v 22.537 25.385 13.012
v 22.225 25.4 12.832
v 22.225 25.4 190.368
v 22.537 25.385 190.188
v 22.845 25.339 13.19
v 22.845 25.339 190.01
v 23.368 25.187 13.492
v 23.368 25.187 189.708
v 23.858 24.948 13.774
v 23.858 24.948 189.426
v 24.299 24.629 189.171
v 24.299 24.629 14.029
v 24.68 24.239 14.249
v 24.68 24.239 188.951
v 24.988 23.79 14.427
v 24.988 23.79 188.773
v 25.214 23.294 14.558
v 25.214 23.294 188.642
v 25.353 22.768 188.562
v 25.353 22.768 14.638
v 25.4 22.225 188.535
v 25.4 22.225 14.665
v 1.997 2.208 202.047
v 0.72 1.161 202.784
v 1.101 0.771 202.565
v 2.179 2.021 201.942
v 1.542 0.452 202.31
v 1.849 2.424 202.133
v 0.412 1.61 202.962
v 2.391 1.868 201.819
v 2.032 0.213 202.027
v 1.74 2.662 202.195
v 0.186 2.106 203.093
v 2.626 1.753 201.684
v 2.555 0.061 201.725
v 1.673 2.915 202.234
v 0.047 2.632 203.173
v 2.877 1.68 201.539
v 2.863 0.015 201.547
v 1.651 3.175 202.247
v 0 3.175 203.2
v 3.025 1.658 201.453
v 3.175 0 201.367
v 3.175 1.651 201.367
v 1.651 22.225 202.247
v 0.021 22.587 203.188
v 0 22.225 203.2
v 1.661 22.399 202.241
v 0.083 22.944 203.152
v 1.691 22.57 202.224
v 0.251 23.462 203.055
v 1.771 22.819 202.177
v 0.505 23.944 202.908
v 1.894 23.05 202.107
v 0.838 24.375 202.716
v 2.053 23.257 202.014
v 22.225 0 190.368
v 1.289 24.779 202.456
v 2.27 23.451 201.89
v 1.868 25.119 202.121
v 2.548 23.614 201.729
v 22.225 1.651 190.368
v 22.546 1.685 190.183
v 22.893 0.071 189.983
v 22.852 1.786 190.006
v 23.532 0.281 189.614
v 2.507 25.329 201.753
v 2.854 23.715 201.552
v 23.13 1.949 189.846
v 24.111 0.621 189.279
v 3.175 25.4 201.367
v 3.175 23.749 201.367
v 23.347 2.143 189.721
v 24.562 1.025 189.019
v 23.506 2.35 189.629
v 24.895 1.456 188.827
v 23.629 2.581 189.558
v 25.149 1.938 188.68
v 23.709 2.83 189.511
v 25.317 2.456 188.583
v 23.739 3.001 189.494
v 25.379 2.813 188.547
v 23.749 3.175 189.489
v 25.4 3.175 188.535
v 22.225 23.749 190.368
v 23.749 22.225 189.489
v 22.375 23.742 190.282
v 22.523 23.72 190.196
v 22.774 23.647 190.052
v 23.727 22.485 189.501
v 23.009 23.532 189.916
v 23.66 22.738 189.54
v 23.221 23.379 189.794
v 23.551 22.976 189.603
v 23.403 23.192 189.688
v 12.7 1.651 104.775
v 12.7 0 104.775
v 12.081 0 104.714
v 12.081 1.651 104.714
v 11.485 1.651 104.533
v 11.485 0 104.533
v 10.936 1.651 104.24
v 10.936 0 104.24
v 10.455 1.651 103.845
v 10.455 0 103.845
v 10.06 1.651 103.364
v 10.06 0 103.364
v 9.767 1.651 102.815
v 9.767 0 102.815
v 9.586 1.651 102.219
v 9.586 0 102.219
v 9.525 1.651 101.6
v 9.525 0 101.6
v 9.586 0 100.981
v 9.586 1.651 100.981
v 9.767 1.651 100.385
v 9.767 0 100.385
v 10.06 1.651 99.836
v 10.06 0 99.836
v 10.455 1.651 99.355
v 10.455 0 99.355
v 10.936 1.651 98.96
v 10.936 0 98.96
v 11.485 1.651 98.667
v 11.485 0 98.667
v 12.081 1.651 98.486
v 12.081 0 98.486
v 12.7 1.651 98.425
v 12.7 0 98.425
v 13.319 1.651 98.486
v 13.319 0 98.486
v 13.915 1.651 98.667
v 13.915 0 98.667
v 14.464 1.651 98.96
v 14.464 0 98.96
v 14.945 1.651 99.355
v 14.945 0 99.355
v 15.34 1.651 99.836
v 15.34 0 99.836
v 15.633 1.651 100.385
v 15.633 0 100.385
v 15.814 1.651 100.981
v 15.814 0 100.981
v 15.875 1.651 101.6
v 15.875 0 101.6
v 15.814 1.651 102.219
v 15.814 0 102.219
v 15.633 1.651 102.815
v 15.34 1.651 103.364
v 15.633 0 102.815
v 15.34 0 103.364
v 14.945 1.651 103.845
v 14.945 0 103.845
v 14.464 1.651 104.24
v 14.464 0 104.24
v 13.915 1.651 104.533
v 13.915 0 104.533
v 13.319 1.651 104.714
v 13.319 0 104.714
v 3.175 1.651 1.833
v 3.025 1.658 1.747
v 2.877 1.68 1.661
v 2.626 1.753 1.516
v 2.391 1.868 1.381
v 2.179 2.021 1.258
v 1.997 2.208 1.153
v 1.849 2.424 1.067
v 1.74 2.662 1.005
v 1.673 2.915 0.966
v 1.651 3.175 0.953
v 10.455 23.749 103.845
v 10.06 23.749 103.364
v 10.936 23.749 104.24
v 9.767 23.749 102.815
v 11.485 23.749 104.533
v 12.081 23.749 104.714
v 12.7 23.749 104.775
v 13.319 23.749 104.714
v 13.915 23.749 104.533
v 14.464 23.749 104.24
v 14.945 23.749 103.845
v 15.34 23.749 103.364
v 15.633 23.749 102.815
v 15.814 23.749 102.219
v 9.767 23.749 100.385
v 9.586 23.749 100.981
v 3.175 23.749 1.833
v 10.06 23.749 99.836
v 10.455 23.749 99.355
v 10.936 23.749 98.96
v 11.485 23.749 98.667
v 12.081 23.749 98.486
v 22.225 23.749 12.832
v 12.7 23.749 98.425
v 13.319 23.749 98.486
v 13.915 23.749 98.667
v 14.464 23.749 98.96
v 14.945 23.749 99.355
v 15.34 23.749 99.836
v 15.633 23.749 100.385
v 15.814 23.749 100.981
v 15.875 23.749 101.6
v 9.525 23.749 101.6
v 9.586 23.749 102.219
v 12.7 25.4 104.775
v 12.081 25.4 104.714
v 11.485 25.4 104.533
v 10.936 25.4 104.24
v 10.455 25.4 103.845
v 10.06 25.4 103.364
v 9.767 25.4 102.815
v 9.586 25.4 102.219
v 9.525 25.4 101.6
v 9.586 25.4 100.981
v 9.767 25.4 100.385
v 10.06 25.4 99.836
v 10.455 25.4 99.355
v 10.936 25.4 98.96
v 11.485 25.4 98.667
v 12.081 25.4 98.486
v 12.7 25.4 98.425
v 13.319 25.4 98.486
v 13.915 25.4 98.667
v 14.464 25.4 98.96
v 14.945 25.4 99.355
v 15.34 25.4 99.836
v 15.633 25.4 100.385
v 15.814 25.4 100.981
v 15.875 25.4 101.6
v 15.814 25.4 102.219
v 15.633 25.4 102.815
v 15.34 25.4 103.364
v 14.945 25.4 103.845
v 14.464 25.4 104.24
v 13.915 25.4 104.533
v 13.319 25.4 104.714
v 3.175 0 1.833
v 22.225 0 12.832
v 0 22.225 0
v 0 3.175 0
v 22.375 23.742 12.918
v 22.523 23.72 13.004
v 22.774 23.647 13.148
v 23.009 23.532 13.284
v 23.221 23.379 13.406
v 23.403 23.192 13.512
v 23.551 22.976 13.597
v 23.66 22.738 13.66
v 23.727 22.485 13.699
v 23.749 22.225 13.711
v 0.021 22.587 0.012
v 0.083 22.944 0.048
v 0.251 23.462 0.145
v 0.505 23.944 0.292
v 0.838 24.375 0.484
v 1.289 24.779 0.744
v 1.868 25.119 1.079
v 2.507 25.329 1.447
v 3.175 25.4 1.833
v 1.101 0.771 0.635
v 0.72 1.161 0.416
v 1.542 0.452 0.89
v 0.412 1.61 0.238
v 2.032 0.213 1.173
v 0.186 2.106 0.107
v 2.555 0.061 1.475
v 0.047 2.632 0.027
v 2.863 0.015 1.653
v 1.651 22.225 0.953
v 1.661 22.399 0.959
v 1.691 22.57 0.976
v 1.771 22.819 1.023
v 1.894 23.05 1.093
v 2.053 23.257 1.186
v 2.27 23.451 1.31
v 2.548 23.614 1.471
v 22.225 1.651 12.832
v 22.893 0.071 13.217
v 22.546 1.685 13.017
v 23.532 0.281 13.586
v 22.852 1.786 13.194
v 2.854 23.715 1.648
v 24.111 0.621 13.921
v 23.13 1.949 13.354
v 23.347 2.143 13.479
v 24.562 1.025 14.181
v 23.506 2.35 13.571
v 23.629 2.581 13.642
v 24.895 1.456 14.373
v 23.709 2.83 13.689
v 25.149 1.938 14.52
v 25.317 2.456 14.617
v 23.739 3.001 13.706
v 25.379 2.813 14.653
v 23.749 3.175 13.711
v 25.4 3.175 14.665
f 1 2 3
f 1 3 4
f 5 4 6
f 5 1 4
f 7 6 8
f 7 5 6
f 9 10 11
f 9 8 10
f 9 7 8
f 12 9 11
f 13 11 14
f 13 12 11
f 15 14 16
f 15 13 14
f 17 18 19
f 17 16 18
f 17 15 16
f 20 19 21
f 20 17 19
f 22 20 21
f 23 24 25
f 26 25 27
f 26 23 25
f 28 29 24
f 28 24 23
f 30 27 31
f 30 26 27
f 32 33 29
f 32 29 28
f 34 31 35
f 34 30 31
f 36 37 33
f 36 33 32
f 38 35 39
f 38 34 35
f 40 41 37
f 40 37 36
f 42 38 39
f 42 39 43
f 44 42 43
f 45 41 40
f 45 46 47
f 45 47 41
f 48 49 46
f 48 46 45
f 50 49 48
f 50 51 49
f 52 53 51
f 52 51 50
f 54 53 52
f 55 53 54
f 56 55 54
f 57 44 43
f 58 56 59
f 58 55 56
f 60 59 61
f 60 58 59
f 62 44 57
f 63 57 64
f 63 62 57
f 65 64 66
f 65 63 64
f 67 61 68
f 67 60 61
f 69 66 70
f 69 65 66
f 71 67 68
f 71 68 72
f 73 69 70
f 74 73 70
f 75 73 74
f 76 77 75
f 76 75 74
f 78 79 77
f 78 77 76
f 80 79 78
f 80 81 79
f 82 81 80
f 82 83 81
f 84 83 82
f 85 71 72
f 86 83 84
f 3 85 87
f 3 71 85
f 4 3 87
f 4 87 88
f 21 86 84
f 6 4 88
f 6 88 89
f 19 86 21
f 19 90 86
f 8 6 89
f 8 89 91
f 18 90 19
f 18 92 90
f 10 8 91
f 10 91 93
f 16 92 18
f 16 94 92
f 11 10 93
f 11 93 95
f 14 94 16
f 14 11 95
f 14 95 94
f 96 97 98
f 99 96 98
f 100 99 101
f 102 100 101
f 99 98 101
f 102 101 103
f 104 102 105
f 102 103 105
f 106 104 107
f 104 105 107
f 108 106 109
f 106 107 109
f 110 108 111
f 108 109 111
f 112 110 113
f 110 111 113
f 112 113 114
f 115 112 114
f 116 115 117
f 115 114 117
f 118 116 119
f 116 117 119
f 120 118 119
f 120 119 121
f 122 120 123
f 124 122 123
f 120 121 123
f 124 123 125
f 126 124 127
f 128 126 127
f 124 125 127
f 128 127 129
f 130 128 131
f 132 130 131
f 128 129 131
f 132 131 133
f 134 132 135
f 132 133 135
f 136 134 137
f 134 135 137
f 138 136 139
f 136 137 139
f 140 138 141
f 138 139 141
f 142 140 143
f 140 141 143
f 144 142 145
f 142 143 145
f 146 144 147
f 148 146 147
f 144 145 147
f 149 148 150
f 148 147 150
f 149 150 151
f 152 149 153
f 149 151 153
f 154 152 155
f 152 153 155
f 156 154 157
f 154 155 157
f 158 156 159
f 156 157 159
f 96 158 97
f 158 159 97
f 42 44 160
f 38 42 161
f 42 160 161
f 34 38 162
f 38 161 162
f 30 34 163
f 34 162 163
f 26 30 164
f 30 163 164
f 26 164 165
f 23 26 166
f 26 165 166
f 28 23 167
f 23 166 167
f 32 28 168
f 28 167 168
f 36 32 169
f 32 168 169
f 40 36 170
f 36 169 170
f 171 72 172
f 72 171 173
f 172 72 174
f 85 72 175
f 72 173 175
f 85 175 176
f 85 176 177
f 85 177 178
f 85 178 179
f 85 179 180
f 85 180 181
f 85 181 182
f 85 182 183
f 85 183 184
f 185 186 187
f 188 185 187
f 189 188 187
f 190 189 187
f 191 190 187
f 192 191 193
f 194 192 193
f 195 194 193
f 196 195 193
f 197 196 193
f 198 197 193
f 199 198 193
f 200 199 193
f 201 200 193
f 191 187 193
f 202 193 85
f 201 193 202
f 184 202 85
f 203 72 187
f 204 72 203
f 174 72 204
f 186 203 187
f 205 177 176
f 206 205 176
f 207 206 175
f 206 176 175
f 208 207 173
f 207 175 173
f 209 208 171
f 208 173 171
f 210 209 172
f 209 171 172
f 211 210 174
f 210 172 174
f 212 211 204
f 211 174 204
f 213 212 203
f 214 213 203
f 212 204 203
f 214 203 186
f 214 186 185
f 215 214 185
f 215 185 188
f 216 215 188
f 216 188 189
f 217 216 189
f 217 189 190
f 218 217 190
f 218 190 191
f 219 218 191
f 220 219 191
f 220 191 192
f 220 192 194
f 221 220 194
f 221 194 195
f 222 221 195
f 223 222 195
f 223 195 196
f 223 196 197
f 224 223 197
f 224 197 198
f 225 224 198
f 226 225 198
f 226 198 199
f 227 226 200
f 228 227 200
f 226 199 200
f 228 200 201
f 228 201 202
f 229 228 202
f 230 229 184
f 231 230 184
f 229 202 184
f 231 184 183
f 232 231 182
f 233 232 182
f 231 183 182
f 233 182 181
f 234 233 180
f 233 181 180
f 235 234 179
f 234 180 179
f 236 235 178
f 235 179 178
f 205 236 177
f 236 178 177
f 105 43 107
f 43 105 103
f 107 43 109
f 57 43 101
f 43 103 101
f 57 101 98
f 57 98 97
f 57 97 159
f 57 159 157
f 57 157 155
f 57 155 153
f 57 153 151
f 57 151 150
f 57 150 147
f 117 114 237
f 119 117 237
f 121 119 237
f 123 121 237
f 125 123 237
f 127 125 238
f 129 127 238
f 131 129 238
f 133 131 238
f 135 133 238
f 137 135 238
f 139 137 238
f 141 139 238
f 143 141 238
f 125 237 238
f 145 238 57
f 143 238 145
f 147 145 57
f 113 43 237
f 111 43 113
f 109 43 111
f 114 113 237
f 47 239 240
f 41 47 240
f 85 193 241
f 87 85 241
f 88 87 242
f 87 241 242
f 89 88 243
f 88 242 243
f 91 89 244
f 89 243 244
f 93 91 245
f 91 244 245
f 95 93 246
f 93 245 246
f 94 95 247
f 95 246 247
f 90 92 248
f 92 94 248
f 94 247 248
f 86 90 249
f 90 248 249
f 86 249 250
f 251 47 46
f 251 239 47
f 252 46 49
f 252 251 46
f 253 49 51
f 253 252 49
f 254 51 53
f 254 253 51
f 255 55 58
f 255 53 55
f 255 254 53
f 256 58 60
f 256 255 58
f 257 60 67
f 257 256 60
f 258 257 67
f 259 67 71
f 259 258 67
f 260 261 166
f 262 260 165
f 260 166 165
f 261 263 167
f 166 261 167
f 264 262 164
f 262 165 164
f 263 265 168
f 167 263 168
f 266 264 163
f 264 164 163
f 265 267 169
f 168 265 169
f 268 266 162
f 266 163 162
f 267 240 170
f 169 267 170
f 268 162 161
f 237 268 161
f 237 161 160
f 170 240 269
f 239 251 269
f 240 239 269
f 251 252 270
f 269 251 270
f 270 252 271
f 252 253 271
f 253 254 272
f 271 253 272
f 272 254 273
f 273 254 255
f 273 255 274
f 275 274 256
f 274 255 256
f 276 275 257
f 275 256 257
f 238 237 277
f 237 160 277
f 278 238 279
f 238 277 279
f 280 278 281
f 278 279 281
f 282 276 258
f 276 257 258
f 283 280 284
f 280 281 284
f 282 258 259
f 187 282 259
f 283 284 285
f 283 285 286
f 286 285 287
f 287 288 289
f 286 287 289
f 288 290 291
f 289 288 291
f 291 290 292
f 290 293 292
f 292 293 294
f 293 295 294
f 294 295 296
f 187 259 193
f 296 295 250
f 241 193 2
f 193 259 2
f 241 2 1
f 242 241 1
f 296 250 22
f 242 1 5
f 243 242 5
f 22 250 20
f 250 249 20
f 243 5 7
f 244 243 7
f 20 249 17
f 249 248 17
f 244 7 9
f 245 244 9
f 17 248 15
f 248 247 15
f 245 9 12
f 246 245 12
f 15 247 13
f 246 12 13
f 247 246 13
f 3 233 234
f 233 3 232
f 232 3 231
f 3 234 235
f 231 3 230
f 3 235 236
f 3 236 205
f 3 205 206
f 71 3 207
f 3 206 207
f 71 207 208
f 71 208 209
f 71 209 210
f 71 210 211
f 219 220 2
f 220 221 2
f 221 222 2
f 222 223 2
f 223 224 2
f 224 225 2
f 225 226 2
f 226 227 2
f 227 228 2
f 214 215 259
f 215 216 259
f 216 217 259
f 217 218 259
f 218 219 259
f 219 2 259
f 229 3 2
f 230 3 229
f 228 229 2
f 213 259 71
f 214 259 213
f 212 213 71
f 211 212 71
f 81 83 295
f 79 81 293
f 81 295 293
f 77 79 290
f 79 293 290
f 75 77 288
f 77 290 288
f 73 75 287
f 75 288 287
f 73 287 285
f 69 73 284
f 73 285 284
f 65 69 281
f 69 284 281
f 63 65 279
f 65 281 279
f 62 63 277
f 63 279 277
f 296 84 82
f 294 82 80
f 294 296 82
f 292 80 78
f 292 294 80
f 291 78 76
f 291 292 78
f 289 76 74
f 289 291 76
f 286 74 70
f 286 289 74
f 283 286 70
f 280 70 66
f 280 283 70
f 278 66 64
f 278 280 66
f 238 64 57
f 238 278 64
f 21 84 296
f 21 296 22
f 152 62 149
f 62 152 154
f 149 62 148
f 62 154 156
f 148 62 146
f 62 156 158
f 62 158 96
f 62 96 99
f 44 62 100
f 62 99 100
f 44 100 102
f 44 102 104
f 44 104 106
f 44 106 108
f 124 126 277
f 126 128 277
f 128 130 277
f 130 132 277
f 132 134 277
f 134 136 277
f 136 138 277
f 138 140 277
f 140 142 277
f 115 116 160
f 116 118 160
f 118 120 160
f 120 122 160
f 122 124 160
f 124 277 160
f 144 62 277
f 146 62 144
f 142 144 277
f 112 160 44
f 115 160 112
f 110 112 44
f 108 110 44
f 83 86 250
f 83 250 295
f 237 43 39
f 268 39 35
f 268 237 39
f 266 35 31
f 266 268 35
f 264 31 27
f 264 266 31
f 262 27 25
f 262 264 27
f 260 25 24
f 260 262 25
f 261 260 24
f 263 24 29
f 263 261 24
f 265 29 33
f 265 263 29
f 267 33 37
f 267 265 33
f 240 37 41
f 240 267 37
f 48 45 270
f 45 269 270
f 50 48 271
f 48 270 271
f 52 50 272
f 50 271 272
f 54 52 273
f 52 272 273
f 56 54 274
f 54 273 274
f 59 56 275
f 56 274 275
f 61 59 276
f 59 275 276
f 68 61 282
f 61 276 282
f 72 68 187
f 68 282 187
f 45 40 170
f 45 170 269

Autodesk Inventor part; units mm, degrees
ref_plane "YZ Plane" through (0, 0, 0) normal (1, 0, 0) x (0, 1, 0)
ref_plane "XZ Plane" through (0, 0, 0) normal (0, 1, 0) x (-1, 0, 0)
ref_plane "XY Plane" through (0, 0, 0) normal (0, 0, 1) x (1, 0, 0)
sketch "Sketch1" plane through (0, 0, 0) normal (0, 0, 1) x (1, 0, 0)
  line L0 (3.175, 0) -> (22.225, 0)
  line L1 (25.4, 3.175) -> (25.4, 22.225)
  line L2 (22.225, 25.4) -> (3.175, 25.4)
  line L3 (0, 22.225) -> (0, 3.175)
  arc A0 (3.175, 25.4) -> (0, 22.225) centre (3.175, 22.225) ccw
  arc A1 (0, 3.175) -> (3.175, 0) centre (3.175, 3.175) ccw
  arc A2 (22.225, 0) -> (25.4, 3.175) centre (22.225, 3.175) ccw
  arc A3 (25.4, 22.225) -> (22.225, 25.4) centre (22.225, 22.225) ccw
  line L4 (3.175, 23.749) -> (22.225, 23.749)
  arc A4 (23.749, 22.225) -> (22.225, 23.749) centre (22.225, 22.225) ccw
  line L5 (23.749, 22.225) -> (23.749, 3.175)
  arc A5 (22.225, 1.651) -> (23.749, 3.175) centre (22.225, 3.175) ccw
  line L6 (22.225, 1.651) -> (3.175, 1.651)
  arc A6 (1.651, 3.175) -> (3.175, 1.651) centre (3.175, 3.175) ccw
  line L7 (1.651, 3.175) -> (1.651, 22.225)
  arc A7 (3.175, 23.749) -> (1.651, 22.225) centre (3.175, 22.225) ccw
  point P0 (0, 0)
  point P1 (25.4, 0)
  point P2 (0, 25.4)
  dimension "d0" = 25.4
  dimension "d1" = 25.4
  dimension "d2" = 3.175
  dimension "d3" = 1.651
extrude "Extrusion1" add sketch "Sketch1" along normal blind 203.2
sketch "Sketch2" plane through (3.175, 25.4, 0) normal (0, 1, 0) x (1, 0, 0)
  line L0 (19.05, -203.2) -> (0, -203.2) projected
  line L1 (-3.175, 0) -> (22.2557, 0)
  line L2 (-3.175, 0) -> (32.385, 0) construction
  line L3 (22.2557, 0) -> (22.2557, -14.6824)
  line L4 (-3.175, 0) -> (22.2557, -14.6824)
  line L5 (-3.175, 0) -> (-3.175, -203.2) construction
  line L6 (-3.175, -101.6) -> (22.2557, -101.6) construction
  line L7 (-3.175, -203.2) -> (22.2557, -203.2)
  line L8 (22.2557, -203.2) -> (22.2557, -188.5176)
  line L9 (-3.175, -203.2) -> (22.2557, -188.5176)
  point P0 (0, 0)
extrude "Extrusion2" cut sketch "Sketch2" against normal blind 203.2
sketch "Sketch3" plane through (3.175, 25.4, 201.3669) normal (0, 1, 0) x (1, 0, 0)
  line L0 (0, 199.5338) -> (0, 0) projected
  line L1 (19.05, 188.5353) -> (19.05, 10.9985) projected
  line L2 (0, 99.7669) -> (19.05, 99.7669) construction
  circle A0 centre (9.525, 99.7669) radius 2.5512
  point P0 (-3.175, 201.3669)
hole "Hole1" at (12.7, 25.4, 101.6) direction (0, -1, 0) diameter 6.35 end through all
properties part number "2f2ao" material "Steel"
